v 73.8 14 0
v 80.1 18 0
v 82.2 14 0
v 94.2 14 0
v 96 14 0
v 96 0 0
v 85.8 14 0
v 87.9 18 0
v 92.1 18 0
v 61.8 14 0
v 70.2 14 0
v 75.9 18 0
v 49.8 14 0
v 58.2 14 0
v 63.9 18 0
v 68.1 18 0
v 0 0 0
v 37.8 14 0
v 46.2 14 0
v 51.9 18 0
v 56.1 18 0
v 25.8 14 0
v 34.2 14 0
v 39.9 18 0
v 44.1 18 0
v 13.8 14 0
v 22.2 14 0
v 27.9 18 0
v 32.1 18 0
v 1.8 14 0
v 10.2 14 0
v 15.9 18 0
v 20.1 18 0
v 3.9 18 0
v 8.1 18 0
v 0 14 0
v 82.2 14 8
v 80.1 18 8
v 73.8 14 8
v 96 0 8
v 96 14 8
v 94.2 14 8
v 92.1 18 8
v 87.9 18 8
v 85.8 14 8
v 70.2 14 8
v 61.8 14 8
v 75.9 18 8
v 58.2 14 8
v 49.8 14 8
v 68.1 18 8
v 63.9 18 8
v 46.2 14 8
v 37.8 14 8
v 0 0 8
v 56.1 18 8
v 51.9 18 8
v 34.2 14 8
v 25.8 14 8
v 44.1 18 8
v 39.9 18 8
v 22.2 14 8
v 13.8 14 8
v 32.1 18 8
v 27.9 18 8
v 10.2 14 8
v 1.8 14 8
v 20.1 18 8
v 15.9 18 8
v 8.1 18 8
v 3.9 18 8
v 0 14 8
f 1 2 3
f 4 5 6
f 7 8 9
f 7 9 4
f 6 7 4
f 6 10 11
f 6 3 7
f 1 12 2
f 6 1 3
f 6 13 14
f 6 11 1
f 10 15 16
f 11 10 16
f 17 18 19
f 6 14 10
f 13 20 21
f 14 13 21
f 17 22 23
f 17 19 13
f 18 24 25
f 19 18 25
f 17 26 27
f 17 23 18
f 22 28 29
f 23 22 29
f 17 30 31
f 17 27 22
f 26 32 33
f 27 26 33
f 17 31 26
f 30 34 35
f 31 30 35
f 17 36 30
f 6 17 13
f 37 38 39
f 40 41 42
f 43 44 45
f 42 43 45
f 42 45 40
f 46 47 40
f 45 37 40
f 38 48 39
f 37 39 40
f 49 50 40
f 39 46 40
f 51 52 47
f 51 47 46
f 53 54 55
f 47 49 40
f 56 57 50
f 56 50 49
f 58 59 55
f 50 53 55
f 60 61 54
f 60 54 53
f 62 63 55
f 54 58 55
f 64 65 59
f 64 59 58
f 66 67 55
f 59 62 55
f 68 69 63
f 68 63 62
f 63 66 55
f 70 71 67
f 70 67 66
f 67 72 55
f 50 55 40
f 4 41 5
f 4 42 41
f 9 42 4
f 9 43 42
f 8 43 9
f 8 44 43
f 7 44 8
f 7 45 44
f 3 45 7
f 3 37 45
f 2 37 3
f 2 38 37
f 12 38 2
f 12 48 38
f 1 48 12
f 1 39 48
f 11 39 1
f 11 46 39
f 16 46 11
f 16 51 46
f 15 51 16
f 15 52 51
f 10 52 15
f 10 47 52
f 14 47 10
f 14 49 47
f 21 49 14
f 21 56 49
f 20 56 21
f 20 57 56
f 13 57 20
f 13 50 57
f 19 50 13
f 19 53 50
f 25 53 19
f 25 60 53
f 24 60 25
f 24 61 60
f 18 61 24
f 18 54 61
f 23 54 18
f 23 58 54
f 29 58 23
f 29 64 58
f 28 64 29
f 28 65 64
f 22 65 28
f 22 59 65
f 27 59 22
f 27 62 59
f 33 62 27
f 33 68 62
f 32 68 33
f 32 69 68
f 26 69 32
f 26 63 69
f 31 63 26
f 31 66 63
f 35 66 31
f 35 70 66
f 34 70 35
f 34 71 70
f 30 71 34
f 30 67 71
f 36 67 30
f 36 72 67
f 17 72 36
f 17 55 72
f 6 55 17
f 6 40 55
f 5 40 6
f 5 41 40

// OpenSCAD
$fn = 32;

// ----------------------------------------------------------------------
// Gear rack: 8 teeth, pitch 12 mm
// ----------------------------------------------------------------------

// --- parameters (mm) ---
teeth = 8;                // number of teeth
pitch = 12;               // tooth pitch, X
root_w = 8.4;             // tooth width at the root
tip_w = 4.2;              // tooth width at the tip
base_h = 14;              // rack body height, Y
tooth_h = 4;              // tooth height above the body
plate_t = 8;              // rack width, Z (extrusion height)
fit_tol = 0.1;            // declared fit tolerance (prompt contract)
free_tol = 0.3;           // declared free tolerance (prompt contract)

rack_l = teeth * pitch;  // overall length
total_h = base_h + tooth_h;  // overall height

profile = [[0, 0], [96, 0], [96, 14], [94.2, 14], [92.1, 18], [87.9, 18], [85.8, 14], [82.2, 14], [80.1, 18], [75.9, 18], [73.8, 14], [70.2, 14], [68.1, 18], [63.9, 18], [61.8, 14], [58.2, 14], [56.1, 18], [51.9, 18], [49.8, 14], [46.2, 14], [44.1, 18], [39.9, 18], [37.8, 14], [34.2, 14], [32.1, 18], [27.9, 18], [25.8, 14], [22.2, 14], [20.1, 18], [15.9, 18], [13.8, 14], [10.2, 14], [8.1, 18], [3.9, 18], [1.8, 14], [0, 14]];  // primary outline, 36 points, counter clockwise

// --- the one profile operation ---
linear_extrude(height = plate_t) polygon(points = profile);
